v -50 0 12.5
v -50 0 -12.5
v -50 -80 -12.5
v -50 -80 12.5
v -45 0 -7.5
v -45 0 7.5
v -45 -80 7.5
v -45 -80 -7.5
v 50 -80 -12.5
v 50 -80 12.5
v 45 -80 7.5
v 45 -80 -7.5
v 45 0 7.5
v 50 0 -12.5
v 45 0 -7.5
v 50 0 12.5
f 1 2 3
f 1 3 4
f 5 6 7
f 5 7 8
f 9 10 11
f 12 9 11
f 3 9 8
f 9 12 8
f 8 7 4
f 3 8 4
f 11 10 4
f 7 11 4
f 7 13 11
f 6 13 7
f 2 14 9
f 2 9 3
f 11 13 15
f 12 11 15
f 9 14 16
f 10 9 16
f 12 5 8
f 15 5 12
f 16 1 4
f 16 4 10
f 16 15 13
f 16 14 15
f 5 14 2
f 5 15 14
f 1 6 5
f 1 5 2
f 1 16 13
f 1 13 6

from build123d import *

# Parameters (mm, degrees)
F2_DEPTH = 80


with BuildPart() as f2:
    # F1 (on Front) → F2 (new body)
    with BuildSketch(Plane.XZ):
        Polygon((50, 12.5), (0, 12.5), (0, 7.5), (45, 7.5), (45, -7.5), (0, -7.5), (0, -12.5), (50, -12.5), align=None)
    extrude(amount=F2_DEPTH)

    # F3: F2 across plane


with BuildPart() as f2_1:
    add(f2.part)
    add(f2.part.mirror(Plane.YZ))


solid = f2_1.part
